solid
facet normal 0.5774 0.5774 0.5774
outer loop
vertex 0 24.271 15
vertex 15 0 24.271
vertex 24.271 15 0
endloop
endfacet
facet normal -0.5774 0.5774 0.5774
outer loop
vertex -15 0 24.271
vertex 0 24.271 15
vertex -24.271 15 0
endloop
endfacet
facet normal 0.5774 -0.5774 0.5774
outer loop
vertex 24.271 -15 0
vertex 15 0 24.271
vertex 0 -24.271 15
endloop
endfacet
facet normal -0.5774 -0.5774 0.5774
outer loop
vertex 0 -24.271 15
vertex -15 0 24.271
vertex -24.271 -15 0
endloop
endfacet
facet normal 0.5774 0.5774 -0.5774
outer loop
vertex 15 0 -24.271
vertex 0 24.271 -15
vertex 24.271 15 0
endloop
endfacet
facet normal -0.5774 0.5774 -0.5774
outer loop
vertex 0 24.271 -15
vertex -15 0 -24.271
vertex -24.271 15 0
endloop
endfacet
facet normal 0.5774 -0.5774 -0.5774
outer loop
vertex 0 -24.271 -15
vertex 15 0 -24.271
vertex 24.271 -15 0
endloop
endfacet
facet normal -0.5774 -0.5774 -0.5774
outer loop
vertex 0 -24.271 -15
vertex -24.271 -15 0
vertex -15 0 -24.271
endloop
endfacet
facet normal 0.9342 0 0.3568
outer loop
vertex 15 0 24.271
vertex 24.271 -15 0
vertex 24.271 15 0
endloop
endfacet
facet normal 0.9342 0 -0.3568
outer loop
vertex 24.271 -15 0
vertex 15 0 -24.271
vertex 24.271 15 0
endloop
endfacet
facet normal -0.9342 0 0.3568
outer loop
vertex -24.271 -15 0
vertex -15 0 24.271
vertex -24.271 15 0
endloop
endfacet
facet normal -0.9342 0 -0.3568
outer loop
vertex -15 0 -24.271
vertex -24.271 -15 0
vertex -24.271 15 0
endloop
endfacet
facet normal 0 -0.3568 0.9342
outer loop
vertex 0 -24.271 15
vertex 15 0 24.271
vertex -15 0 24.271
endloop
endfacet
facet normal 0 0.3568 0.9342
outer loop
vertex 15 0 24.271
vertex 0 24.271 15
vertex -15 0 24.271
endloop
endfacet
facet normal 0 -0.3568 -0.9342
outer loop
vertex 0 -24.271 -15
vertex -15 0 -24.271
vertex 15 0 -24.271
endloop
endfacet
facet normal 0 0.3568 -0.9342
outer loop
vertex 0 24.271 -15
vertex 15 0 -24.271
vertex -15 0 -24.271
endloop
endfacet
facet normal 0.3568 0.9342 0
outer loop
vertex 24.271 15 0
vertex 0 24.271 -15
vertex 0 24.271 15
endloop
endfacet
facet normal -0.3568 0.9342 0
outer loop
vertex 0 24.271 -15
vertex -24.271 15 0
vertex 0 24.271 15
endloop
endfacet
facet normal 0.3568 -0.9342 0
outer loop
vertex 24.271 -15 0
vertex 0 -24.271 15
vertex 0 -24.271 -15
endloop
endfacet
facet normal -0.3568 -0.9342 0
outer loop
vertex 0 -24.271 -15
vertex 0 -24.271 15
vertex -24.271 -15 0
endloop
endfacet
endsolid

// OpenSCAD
// Regular Icosahedron
// (C) @oblomobka - 2023.06
// GPL license

 /* **CUSTOMIZER VARIABLES** */
// Edge
edge = 30; //[10:100]
// Center of the solid or stand over a face
position = "Center"; //["Center", "Face"]

module IcosahedronRegular ( edge = 30, position = "Face"){ 
    // Constants
    phi = (1+sqrt(5))/2; // Golden ratio = 1,618...
    
    // Invariants
    diAngleIcosahedron = acos(-sqrt(5)/3); // dihedral angle of Icosahedron = 138,1897...
    
    // Relations
    rCirIcosahedron = sqrt(phi*sqrt(5))/2; // radius of a circumscribed sphere for edge = 1 / =0,951...
    rInsIcosahedron = phi^2/(2*sqrt(3)); // radius of a inscribed sphere for edge = 1 / =0,7558...
    rMidIcosahedron = phi/2; // Midradius, which touches the middle of each edge / =0,809...
    
    // Variables
    // longSide (a): shortSide (b) depicts the 3 rectangles (one in each plane (xy - xz - yz) to depict the 12 vertices of Icosahedron
    a = edge*phi/2;
    b = edge/2;
    
    // Definition of points and faces V = 12 / F = 20
    // 12 vertices -> Even permutations of ( +-phi, +-1, 0)
    Ipoints = [ 
        // Build 3 rectangles on plane XY/XZ/YZ
        [ +a, +b, 0], [ -a, +b, 0], [ +a, -b, 0], [ -a, -b, 0],         // XY [  0,  1,  2,  3]
        [ +b, 0, +a], [ -b, 0, +a], [ +b, 0, -a], [ -b, 0, -a],         // XZ [  4,  5,  6,  7]  
        [ 0, +a, +b], [ 0, -a, +b], [ 0, +a, -b], [ 0, -a, -b]          // YZ [  8,  9, 10, 11]
        ];
         
    Ifaces = [
        // Build 8 triangles. One triangle per octant
        [  0,  4,  8], [  1,  8,  5], [  9,  4,  2], [  3,  5,  9],     // UP
        [  0, 10,  6], [  1,  7, 10], [  2,  6, 11], [  7,  3, 11],     // DOWN
        // Pairs of triangles on shortSide of rectangles
        [  0,  2,  4], [  0,  6,  2], [  1,  5,  3], [  1,  3,  7],     // XY
        [  5,  4,  9], [  5,  8,  4], [  6,  7, 11], [  7,  6, 10],     // XZ
        [  8, 10,  0], [  8,  1, 10], [ 11,  9,  2], [  3,  9, 11]      // YZ
        ];
    
    // Polyhedron stands on xy plane centered on the center of the face or centered on the center of polyhedron
    if ( position == "Face"){
        translate ([ 0, 0, edge*rInsIcosahedron])
            rotate ([ 90-diAngleIcosahedron/2, 0, 0])
                polyhedron ( Ipoints, Ifaces);}
    else if ( position == "Center") {
        polyhedron ( Ipoints, Ifaces);} 
}

/* **RENDERING OF SOLIDS** */ 
IcosahedronRegular ( edge = edge, position = position);
